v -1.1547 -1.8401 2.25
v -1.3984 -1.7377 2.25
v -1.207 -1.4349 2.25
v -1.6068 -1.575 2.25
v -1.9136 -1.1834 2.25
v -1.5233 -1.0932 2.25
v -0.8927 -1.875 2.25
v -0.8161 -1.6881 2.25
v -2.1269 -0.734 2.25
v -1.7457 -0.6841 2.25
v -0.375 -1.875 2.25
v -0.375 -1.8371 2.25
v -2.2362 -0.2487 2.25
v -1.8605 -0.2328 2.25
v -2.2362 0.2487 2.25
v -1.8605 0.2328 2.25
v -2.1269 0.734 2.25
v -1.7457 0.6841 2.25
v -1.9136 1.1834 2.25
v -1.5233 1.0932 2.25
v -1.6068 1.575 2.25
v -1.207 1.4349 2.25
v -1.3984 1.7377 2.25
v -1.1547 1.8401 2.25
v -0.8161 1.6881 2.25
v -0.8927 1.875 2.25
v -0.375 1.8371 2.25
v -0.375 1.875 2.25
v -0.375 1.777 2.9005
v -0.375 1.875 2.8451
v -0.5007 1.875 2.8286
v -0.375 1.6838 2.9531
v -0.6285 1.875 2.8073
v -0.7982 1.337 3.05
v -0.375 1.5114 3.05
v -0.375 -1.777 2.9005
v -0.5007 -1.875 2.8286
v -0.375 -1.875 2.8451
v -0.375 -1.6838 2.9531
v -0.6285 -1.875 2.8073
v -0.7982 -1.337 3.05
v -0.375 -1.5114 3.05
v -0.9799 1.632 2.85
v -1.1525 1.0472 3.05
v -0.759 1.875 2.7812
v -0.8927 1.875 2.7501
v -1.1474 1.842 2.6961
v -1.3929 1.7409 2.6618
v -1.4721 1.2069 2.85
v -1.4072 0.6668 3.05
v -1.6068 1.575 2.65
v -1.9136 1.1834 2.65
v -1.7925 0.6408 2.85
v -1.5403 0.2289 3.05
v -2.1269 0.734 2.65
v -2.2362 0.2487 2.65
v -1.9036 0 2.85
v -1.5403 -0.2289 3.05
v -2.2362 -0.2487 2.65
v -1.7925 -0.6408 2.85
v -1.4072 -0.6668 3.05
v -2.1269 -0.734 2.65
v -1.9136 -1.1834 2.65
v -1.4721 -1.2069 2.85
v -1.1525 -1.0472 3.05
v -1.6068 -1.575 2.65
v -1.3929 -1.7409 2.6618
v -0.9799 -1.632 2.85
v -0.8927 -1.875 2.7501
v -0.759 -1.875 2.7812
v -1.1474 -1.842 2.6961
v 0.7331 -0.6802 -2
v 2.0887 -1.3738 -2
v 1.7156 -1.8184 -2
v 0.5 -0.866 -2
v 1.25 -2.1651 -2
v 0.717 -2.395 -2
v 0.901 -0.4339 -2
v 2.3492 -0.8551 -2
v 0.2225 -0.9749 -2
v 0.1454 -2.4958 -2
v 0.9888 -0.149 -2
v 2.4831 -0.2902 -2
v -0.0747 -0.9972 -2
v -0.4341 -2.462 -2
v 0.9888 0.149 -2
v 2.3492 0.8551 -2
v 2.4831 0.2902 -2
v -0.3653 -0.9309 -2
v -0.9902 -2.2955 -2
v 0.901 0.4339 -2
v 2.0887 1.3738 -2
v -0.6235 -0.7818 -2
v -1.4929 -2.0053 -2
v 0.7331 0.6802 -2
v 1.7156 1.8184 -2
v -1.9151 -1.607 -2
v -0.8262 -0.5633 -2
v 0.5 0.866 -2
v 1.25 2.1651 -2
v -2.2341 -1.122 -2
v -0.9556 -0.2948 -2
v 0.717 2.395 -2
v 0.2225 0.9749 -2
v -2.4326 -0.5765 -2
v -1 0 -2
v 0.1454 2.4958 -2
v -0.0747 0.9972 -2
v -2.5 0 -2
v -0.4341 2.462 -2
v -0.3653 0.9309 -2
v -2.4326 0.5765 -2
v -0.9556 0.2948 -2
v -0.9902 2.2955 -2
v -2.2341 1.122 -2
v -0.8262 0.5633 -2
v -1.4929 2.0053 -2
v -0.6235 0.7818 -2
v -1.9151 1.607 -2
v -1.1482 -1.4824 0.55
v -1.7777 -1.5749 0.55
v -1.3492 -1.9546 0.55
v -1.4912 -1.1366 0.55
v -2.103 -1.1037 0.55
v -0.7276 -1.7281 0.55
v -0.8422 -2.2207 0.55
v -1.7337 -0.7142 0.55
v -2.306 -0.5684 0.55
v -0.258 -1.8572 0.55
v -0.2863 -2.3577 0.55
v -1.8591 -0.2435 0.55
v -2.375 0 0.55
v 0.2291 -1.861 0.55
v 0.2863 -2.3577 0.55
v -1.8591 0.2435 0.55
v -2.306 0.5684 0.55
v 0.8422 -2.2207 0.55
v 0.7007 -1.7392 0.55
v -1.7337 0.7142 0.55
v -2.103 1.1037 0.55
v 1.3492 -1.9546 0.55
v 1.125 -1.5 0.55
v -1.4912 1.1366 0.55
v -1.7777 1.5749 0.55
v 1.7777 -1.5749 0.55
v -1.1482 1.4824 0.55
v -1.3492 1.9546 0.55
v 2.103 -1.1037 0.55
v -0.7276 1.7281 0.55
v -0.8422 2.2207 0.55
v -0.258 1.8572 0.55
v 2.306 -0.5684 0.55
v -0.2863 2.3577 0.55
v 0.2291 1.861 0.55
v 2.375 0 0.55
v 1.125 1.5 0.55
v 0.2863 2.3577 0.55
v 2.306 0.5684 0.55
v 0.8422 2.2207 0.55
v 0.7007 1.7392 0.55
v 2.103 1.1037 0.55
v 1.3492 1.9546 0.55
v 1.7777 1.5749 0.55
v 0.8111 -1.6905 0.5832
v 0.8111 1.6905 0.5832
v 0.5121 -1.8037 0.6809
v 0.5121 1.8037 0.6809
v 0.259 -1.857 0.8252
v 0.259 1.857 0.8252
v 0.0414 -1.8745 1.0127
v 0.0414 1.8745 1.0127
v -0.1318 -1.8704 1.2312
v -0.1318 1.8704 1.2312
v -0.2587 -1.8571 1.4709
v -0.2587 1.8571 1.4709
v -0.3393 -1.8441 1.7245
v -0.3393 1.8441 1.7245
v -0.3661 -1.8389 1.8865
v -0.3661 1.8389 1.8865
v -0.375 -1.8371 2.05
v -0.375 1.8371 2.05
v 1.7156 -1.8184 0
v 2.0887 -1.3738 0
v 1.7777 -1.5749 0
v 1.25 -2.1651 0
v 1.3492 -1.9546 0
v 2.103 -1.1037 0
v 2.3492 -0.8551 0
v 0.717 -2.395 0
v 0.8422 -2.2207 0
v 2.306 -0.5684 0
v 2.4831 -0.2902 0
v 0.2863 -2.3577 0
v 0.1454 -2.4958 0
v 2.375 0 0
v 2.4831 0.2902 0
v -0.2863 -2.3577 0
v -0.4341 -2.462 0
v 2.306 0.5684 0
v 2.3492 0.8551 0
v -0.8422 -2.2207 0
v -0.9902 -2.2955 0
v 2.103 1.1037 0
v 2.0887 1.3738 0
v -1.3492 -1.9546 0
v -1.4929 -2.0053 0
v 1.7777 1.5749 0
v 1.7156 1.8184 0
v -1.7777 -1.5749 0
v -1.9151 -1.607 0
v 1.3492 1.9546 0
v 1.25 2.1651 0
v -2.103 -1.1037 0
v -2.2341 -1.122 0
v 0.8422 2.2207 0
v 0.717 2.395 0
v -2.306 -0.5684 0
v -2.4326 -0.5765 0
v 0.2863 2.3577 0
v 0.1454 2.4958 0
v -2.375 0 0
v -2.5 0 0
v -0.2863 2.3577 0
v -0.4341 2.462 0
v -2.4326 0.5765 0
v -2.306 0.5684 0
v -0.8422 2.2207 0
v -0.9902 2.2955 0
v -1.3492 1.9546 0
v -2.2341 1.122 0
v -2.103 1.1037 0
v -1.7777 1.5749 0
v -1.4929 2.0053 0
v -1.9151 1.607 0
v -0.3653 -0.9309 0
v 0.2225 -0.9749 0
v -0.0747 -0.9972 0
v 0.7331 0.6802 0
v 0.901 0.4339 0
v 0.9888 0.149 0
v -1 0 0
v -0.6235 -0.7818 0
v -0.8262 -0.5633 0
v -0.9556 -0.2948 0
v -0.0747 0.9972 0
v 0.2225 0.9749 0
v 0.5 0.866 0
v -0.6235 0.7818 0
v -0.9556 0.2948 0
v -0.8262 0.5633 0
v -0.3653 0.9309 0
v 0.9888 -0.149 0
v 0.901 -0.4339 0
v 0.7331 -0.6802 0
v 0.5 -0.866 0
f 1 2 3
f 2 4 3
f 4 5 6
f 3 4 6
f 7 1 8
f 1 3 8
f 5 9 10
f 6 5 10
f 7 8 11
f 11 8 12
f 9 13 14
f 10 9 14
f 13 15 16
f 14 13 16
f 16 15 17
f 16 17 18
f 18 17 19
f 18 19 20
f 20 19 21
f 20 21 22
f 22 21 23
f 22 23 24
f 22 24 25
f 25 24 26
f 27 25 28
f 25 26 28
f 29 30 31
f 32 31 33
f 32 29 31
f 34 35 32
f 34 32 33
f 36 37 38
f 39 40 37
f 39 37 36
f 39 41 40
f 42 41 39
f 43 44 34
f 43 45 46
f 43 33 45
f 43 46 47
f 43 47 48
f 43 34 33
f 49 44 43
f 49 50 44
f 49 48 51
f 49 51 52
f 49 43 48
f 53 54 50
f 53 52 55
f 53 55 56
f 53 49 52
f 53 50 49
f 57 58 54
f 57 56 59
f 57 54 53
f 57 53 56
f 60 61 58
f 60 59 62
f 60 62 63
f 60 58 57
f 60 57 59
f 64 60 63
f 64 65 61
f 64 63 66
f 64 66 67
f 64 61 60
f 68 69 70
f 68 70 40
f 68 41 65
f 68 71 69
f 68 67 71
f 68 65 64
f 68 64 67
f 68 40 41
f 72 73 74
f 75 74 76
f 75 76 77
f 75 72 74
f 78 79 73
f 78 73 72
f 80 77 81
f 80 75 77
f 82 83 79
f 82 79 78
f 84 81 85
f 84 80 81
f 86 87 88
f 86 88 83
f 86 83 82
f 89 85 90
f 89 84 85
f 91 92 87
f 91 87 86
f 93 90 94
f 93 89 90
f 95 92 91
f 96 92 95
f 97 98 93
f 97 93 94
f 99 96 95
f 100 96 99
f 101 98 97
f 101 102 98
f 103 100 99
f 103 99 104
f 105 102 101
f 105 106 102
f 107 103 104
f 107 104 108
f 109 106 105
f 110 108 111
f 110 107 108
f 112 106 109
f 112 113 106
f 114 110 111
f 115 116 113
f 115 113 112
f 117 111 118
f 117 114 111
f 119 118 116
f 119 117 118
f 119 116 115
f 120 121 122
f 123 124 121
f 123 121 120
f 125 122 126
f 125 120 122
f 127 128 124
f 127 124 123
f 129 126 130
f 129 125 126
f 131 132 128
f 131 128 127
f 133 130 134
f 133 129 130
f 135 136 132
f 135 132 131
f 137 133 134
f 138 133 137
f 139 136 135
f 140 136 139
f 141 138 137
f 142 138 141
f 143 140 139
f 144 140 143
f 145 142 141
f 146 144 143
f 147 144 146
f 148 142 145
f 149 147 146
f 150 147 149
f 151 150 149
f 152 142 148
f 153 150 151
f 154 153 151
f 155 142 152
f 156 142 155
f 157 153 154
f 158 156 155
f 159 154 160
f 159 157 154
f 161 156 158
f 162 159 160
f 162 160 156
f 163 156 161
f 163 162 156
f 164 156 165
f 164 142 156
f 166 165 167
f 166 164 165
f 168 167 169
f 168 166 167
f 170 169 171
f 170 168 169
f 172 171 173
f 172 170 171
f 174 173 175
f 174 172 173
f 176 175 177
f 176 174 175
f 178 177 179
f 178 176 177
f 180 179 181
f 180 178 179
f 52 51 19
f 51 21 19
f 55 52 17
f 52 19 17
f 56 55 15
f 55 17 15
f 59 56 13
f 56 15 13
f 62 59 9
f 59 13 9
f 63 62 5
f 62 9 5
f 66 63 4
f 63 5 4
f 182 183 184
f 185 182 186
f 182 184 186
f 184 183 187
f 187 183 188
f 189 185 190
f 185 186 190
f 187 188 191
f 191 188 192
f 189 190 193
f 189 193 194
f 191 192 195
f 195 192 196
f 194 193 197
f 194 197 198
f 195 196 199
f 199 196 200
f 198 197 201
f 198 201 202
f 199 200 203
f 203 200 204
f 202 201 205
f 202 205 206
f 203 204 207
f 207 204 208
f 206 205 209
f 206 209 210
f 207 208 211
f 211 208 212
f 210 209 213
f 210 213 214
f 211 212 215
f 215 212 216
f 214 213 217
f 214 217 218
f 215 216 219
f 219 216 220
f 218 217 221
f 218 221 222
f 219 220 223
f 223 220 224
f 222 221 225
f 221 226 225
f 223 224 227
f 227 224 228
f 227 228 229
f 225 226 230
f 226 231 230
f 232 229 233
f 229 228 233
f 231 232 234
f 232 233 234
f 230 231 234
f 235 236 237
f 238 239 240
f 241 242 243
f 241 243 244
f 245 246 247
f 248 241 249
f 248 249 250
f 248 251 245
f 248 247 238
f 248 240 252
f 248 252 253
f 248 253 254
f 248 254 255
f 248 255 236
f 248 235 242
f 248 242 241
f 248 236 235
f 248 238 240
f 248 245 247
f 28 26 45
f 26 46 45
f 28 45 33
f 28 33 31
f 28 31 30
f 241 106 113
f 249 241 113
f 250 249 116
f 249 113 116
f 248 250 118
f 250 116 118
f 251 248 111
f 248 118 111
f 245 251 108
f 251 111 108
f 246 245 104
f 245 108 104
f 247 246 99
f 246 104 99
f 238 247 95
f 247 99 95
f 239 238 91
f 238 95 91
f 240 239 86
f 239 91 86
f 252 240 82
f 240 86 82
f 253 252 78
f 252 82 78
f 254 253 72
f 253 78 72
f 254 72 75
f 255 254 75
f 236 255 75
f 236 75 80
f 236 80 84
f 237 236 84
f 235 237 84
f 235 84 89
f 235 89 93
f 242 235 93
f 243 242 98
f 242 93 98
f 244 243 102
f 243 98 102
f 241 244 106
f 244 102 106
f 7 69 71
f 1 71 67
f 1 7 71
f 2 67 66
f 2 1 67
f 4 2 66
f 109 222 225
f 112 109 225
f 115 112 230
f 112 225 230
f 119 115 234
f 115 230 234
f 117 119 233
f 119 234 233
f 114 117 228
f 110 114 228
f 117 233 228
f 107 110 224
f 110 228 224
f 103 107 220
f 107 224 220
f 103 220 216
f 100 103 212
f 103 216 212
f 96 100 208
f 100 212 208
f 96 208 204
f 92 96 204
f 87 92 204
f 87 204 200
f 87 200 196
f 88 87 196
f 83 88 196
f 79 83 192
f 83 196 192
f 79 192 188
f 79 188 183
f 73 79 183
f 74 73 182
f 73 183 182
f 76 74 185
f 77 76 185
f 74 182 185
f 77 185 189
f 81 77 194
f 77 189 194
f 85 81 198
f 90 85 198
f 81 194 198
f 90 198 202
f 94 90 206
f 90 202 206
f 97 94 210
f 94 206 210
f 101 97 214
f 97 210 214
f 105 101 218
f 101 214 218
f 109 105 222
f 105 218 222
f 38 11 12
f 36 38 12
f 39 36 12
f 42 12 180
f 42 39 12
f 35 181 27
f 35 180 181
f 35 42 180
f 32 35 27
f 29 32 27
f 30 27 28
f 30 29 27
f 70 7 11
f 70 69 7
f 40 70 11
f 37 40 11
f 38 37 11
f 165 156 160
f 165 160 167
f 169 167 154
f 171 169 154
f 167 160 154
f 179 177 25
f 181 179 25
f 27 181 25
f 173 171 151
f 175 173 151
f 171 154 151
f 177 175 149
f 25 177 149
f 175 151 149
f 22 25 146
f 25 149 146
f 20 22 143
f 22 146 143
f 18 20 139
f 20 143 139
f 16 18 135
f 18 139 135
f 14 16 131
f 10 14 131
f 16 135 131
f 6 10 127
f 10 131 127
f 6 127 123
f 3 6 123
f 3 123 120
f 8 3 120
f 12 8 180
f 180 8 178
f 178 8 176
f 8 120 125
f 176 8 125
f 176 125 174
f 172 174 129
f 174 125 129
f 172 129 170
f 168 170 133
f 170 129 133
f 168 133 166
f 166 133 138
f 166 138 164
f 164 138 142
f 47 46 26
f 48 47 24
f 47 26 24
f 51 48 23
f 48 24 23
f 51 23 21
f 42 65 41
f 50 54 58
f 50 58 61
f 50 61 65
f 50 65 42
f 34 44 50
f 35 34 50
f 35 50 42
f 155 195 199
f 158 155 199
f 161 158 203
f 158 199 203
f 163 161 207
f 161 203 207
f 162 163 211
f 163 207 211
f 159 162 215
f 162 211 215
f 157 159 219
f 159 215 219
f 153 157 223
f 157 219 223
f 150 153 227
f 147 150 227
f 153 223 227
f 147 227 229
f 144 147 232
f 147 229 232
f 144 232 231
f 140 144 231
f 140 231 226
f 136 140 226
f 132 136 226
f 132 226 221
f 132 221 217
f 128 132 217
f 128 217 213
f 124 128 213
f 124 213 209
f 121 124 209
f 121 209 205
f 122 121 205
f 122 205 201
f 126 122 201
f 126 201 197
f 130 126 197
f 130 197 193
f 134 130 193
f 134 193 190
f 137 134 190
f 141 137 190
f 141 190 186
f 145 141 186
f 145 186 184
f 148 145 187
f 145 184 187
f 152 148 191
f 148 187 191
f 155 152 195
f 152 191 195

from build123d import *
from OCP.BRepFilletAPI import BRepFilletAPI_MakeChamfer

# Parameters (mm, degrees)
SKETCH1_R               = 2.375
BOSS_EXTRUDE1_DEPTH     = 0.55
SKETCH2_R               = 1.875
BOSS_EXTRUDE2_DEPTH     = 1.7
SKETCH3_R               = 2.5
BOSS_EXTRUDE3_DEPTH     = 2
SKETCH4_R               = 2.25
BOSS_EXTRUDE4_DEPTH     = 0.8
CUT_EXTRUDE1_REACH      = 8.165
SKETCH5_W               = 0.75
SKETCH5_H               = 6.07376998
CHAMFER1_SIZE           = 0.4
CHAMFER1_SIZE2          = 0.692820323
SKETCH6_W               = 6.999273813
SKETCH6_H               = 5.334981493
SKETCH6_W_2             = 6.558585844
SKETCH6_H_2             = 3.75
CUT_EXTRUDE3_DEPTH      = 2
FILLET2_R               = 1
SKETCH7_R               = 1
CUT_EXTRUDE4_DEPTH      = 2
CUT_EXTRUDE5_DEPTH      = 3
CUT_EXTRUDE5_DEPTH_BACK = 10
SKETCH9_W               = 3.309409713
SKETCH9_H               = 2.920914296
FILLET3_R               = 1.5


with BuildPart() as part:
    # Sketch1 → Boss-Extrude1 (new body)
    with BuildSketch(Plane.XY):
        Circle(SKETCH1_R)
    extrude(amount=BOSS_EXTRUDE1_DEPTH)

    # Sketch2 → Boss-Extrude2 (add)
    with BuildSketch(Plane.XY.offset(0.55)):
        Circle(SKETCH2_R)
    extrude(amount=BOSS_EXTRUDE2_DEPTH)

    # Sketch3 → Boss-Extrude3 (add)
    with BuildSketch(Plane(origin=(0, 0, 0), x_dir=(-1, 0, 0), z_dir=(0, 0, -1))):
        Circle(SKETCH3_R)
    extrude(amount=BOSS_EXTRUDE3_DEPTH)

    # Sketch4 → Boss-Extrude4 (add)
    with BuildSketch(Plane.XY.offset(2.25)):
        Circle(SKETCH4_R)
    extrude(amount=BOSS_EXTRUDE4_DEPTH)

    # Cut-Extrude1: up to this face of the body (flat: up to its plane)
    cut_extrude1_end = Plane(part.part.faces().sort_by_distance((-2.307824856, 0, 0.55))[0])
    # Sketch5 → Cut-Extrude1 (cut, up to the picked face)
    with BuildSketch(Plane.XY.offset(3.05), mode=Mode.PRIVATE) as cut_extrude1_sk1:
        Rectangle(SKETCH5_W, SKETCH5_H)
    cut_extrude1_tool1 = split(extrude(cut_extrude1_sk1.sketch, amount=-CUT_EXTRUDE1_REACH, mode=Mode.PRIVATE), bisect_by=cut_extrude1_end, keep=Keep.BOTH, mode=Mode.PRIVATE)
    add(cut_extrude1_tool1.solids().sort_by(Axis((0, 0, 3.05), (0, 0, -1)))[0], mode=Mode.SUBTRACT)

    # Chamfer1: one chamfer whose edges measure the first distance from different faces: ONE call of the kernel's chamfer builder (chamfer() names one face for all edges)
    chamfer1_edges_1 = [part.edges().sort_by_distance(p)[0] for p in [
        (-2.25, 0, 3.05),
    ]]
    chamfer1_side_1 = [part.faces().sort_by_distance(p)[0] for p in [
        (-2.25, 0, 2.65),
    ]]
    chamfer1_edges_2 = [part.edges().sort_by_distance(p)[0] for p in [
        (2.25, 0, 3.05),
    ]]
    chamfer1_side_2 = [part.faces().sort_by_distance(p)[0] for p in [
        (2.25, 0, 2.65),
    ]]
    chamfer1 = BRepFilletAPI_MakeChamfer(part.part.solid().wrapped)
    for e in chamfer1_edges_1:
        chamfer1.Add(CHAMFER1_SIZE, CHAMFER1_SIZE2, e.wrapped, chamfer1_side_1[0].wrapped)  # the first distance lies on this face
    for e in chamfer1_edges_2:
        chamfer1.Add(CHAMFER1_SIZE, CHAMFER1_SIZE2, e.wrapped, chamfer1_side_2[0].wrapped)  # the first distance lies on this face
    add(Compound.cast(chamfer1.Shape()), mode=Mode.REPLACE)

    # Sketch6 → Cut-Extrude3 (cut)
    with BuildSketch(Plane.XY.offset(3.05)):
        with Locations((0.047792, -0.043471688)):
            Rectangle(SKETCH6_W, SKETCH6_H)
        Rectangle(SKETCH6_W_2, SKETCH6_H_2, mode=Mode.SUBTRACT)
    extrude(amount=-CUT_EXTRUDE3_DEPTH, mode=Mode.SUBTRACT)

    # Fillet2
    fillet2_edges = [part.edges().sort_by_distance(p)[0] for p in [
        (-1.243734296, 1.875, 2.45),
        (1.243734296, 1.875, 2.45),
        (-1.243734296, -1.875, 2.45),
        (1.243734296, -1.875, 2.45),
    ]]
    fillet(fillet2_edges, radius=FILLET2_R)

    # Sketch7 → Cut-Extrude4 (cut)
    with BuildSketch(Plane(origin=(0, 0, -2), x_dir=(-1, 0, 0), z_dir=(0, 0, -1))):
        Circle(SKETCH7_R)
    extrude(amount=-CUT_EXTRUDE4_DEPTH, mode=Mode.SUBTRACT)

    # Sketch9 → Cut-Extrude5 (cut, two sides: drawn at the far end of the back side and taken through both)
    with BuildSketch(Plane(origin=(0, 0, 0), x_dir=(1, 0, 0), z_dir=(0, 1, 0)).offset(-CUT_EXTRUDE5_DEPTH_BACK)):
        with Locations((1.654704857, -2.010457148)):
            Rectangle(SKETCH9_W, SKETCH9_H)
    extrude(amount=CUT_EXTRUDE5_DEPTH + CUT_EXTRUDE5_DEPTH_BACK, mode=Mode.SUBTRACT)

    # Fillet3
    fillet3_edges = [part.edges().sort_by_distance(p)[0] for p in [
        (-0.375, 0, 0.55),
    ]]
    fillet(fillet3_edges, radius=FILLET3_R)


solid = part.part
